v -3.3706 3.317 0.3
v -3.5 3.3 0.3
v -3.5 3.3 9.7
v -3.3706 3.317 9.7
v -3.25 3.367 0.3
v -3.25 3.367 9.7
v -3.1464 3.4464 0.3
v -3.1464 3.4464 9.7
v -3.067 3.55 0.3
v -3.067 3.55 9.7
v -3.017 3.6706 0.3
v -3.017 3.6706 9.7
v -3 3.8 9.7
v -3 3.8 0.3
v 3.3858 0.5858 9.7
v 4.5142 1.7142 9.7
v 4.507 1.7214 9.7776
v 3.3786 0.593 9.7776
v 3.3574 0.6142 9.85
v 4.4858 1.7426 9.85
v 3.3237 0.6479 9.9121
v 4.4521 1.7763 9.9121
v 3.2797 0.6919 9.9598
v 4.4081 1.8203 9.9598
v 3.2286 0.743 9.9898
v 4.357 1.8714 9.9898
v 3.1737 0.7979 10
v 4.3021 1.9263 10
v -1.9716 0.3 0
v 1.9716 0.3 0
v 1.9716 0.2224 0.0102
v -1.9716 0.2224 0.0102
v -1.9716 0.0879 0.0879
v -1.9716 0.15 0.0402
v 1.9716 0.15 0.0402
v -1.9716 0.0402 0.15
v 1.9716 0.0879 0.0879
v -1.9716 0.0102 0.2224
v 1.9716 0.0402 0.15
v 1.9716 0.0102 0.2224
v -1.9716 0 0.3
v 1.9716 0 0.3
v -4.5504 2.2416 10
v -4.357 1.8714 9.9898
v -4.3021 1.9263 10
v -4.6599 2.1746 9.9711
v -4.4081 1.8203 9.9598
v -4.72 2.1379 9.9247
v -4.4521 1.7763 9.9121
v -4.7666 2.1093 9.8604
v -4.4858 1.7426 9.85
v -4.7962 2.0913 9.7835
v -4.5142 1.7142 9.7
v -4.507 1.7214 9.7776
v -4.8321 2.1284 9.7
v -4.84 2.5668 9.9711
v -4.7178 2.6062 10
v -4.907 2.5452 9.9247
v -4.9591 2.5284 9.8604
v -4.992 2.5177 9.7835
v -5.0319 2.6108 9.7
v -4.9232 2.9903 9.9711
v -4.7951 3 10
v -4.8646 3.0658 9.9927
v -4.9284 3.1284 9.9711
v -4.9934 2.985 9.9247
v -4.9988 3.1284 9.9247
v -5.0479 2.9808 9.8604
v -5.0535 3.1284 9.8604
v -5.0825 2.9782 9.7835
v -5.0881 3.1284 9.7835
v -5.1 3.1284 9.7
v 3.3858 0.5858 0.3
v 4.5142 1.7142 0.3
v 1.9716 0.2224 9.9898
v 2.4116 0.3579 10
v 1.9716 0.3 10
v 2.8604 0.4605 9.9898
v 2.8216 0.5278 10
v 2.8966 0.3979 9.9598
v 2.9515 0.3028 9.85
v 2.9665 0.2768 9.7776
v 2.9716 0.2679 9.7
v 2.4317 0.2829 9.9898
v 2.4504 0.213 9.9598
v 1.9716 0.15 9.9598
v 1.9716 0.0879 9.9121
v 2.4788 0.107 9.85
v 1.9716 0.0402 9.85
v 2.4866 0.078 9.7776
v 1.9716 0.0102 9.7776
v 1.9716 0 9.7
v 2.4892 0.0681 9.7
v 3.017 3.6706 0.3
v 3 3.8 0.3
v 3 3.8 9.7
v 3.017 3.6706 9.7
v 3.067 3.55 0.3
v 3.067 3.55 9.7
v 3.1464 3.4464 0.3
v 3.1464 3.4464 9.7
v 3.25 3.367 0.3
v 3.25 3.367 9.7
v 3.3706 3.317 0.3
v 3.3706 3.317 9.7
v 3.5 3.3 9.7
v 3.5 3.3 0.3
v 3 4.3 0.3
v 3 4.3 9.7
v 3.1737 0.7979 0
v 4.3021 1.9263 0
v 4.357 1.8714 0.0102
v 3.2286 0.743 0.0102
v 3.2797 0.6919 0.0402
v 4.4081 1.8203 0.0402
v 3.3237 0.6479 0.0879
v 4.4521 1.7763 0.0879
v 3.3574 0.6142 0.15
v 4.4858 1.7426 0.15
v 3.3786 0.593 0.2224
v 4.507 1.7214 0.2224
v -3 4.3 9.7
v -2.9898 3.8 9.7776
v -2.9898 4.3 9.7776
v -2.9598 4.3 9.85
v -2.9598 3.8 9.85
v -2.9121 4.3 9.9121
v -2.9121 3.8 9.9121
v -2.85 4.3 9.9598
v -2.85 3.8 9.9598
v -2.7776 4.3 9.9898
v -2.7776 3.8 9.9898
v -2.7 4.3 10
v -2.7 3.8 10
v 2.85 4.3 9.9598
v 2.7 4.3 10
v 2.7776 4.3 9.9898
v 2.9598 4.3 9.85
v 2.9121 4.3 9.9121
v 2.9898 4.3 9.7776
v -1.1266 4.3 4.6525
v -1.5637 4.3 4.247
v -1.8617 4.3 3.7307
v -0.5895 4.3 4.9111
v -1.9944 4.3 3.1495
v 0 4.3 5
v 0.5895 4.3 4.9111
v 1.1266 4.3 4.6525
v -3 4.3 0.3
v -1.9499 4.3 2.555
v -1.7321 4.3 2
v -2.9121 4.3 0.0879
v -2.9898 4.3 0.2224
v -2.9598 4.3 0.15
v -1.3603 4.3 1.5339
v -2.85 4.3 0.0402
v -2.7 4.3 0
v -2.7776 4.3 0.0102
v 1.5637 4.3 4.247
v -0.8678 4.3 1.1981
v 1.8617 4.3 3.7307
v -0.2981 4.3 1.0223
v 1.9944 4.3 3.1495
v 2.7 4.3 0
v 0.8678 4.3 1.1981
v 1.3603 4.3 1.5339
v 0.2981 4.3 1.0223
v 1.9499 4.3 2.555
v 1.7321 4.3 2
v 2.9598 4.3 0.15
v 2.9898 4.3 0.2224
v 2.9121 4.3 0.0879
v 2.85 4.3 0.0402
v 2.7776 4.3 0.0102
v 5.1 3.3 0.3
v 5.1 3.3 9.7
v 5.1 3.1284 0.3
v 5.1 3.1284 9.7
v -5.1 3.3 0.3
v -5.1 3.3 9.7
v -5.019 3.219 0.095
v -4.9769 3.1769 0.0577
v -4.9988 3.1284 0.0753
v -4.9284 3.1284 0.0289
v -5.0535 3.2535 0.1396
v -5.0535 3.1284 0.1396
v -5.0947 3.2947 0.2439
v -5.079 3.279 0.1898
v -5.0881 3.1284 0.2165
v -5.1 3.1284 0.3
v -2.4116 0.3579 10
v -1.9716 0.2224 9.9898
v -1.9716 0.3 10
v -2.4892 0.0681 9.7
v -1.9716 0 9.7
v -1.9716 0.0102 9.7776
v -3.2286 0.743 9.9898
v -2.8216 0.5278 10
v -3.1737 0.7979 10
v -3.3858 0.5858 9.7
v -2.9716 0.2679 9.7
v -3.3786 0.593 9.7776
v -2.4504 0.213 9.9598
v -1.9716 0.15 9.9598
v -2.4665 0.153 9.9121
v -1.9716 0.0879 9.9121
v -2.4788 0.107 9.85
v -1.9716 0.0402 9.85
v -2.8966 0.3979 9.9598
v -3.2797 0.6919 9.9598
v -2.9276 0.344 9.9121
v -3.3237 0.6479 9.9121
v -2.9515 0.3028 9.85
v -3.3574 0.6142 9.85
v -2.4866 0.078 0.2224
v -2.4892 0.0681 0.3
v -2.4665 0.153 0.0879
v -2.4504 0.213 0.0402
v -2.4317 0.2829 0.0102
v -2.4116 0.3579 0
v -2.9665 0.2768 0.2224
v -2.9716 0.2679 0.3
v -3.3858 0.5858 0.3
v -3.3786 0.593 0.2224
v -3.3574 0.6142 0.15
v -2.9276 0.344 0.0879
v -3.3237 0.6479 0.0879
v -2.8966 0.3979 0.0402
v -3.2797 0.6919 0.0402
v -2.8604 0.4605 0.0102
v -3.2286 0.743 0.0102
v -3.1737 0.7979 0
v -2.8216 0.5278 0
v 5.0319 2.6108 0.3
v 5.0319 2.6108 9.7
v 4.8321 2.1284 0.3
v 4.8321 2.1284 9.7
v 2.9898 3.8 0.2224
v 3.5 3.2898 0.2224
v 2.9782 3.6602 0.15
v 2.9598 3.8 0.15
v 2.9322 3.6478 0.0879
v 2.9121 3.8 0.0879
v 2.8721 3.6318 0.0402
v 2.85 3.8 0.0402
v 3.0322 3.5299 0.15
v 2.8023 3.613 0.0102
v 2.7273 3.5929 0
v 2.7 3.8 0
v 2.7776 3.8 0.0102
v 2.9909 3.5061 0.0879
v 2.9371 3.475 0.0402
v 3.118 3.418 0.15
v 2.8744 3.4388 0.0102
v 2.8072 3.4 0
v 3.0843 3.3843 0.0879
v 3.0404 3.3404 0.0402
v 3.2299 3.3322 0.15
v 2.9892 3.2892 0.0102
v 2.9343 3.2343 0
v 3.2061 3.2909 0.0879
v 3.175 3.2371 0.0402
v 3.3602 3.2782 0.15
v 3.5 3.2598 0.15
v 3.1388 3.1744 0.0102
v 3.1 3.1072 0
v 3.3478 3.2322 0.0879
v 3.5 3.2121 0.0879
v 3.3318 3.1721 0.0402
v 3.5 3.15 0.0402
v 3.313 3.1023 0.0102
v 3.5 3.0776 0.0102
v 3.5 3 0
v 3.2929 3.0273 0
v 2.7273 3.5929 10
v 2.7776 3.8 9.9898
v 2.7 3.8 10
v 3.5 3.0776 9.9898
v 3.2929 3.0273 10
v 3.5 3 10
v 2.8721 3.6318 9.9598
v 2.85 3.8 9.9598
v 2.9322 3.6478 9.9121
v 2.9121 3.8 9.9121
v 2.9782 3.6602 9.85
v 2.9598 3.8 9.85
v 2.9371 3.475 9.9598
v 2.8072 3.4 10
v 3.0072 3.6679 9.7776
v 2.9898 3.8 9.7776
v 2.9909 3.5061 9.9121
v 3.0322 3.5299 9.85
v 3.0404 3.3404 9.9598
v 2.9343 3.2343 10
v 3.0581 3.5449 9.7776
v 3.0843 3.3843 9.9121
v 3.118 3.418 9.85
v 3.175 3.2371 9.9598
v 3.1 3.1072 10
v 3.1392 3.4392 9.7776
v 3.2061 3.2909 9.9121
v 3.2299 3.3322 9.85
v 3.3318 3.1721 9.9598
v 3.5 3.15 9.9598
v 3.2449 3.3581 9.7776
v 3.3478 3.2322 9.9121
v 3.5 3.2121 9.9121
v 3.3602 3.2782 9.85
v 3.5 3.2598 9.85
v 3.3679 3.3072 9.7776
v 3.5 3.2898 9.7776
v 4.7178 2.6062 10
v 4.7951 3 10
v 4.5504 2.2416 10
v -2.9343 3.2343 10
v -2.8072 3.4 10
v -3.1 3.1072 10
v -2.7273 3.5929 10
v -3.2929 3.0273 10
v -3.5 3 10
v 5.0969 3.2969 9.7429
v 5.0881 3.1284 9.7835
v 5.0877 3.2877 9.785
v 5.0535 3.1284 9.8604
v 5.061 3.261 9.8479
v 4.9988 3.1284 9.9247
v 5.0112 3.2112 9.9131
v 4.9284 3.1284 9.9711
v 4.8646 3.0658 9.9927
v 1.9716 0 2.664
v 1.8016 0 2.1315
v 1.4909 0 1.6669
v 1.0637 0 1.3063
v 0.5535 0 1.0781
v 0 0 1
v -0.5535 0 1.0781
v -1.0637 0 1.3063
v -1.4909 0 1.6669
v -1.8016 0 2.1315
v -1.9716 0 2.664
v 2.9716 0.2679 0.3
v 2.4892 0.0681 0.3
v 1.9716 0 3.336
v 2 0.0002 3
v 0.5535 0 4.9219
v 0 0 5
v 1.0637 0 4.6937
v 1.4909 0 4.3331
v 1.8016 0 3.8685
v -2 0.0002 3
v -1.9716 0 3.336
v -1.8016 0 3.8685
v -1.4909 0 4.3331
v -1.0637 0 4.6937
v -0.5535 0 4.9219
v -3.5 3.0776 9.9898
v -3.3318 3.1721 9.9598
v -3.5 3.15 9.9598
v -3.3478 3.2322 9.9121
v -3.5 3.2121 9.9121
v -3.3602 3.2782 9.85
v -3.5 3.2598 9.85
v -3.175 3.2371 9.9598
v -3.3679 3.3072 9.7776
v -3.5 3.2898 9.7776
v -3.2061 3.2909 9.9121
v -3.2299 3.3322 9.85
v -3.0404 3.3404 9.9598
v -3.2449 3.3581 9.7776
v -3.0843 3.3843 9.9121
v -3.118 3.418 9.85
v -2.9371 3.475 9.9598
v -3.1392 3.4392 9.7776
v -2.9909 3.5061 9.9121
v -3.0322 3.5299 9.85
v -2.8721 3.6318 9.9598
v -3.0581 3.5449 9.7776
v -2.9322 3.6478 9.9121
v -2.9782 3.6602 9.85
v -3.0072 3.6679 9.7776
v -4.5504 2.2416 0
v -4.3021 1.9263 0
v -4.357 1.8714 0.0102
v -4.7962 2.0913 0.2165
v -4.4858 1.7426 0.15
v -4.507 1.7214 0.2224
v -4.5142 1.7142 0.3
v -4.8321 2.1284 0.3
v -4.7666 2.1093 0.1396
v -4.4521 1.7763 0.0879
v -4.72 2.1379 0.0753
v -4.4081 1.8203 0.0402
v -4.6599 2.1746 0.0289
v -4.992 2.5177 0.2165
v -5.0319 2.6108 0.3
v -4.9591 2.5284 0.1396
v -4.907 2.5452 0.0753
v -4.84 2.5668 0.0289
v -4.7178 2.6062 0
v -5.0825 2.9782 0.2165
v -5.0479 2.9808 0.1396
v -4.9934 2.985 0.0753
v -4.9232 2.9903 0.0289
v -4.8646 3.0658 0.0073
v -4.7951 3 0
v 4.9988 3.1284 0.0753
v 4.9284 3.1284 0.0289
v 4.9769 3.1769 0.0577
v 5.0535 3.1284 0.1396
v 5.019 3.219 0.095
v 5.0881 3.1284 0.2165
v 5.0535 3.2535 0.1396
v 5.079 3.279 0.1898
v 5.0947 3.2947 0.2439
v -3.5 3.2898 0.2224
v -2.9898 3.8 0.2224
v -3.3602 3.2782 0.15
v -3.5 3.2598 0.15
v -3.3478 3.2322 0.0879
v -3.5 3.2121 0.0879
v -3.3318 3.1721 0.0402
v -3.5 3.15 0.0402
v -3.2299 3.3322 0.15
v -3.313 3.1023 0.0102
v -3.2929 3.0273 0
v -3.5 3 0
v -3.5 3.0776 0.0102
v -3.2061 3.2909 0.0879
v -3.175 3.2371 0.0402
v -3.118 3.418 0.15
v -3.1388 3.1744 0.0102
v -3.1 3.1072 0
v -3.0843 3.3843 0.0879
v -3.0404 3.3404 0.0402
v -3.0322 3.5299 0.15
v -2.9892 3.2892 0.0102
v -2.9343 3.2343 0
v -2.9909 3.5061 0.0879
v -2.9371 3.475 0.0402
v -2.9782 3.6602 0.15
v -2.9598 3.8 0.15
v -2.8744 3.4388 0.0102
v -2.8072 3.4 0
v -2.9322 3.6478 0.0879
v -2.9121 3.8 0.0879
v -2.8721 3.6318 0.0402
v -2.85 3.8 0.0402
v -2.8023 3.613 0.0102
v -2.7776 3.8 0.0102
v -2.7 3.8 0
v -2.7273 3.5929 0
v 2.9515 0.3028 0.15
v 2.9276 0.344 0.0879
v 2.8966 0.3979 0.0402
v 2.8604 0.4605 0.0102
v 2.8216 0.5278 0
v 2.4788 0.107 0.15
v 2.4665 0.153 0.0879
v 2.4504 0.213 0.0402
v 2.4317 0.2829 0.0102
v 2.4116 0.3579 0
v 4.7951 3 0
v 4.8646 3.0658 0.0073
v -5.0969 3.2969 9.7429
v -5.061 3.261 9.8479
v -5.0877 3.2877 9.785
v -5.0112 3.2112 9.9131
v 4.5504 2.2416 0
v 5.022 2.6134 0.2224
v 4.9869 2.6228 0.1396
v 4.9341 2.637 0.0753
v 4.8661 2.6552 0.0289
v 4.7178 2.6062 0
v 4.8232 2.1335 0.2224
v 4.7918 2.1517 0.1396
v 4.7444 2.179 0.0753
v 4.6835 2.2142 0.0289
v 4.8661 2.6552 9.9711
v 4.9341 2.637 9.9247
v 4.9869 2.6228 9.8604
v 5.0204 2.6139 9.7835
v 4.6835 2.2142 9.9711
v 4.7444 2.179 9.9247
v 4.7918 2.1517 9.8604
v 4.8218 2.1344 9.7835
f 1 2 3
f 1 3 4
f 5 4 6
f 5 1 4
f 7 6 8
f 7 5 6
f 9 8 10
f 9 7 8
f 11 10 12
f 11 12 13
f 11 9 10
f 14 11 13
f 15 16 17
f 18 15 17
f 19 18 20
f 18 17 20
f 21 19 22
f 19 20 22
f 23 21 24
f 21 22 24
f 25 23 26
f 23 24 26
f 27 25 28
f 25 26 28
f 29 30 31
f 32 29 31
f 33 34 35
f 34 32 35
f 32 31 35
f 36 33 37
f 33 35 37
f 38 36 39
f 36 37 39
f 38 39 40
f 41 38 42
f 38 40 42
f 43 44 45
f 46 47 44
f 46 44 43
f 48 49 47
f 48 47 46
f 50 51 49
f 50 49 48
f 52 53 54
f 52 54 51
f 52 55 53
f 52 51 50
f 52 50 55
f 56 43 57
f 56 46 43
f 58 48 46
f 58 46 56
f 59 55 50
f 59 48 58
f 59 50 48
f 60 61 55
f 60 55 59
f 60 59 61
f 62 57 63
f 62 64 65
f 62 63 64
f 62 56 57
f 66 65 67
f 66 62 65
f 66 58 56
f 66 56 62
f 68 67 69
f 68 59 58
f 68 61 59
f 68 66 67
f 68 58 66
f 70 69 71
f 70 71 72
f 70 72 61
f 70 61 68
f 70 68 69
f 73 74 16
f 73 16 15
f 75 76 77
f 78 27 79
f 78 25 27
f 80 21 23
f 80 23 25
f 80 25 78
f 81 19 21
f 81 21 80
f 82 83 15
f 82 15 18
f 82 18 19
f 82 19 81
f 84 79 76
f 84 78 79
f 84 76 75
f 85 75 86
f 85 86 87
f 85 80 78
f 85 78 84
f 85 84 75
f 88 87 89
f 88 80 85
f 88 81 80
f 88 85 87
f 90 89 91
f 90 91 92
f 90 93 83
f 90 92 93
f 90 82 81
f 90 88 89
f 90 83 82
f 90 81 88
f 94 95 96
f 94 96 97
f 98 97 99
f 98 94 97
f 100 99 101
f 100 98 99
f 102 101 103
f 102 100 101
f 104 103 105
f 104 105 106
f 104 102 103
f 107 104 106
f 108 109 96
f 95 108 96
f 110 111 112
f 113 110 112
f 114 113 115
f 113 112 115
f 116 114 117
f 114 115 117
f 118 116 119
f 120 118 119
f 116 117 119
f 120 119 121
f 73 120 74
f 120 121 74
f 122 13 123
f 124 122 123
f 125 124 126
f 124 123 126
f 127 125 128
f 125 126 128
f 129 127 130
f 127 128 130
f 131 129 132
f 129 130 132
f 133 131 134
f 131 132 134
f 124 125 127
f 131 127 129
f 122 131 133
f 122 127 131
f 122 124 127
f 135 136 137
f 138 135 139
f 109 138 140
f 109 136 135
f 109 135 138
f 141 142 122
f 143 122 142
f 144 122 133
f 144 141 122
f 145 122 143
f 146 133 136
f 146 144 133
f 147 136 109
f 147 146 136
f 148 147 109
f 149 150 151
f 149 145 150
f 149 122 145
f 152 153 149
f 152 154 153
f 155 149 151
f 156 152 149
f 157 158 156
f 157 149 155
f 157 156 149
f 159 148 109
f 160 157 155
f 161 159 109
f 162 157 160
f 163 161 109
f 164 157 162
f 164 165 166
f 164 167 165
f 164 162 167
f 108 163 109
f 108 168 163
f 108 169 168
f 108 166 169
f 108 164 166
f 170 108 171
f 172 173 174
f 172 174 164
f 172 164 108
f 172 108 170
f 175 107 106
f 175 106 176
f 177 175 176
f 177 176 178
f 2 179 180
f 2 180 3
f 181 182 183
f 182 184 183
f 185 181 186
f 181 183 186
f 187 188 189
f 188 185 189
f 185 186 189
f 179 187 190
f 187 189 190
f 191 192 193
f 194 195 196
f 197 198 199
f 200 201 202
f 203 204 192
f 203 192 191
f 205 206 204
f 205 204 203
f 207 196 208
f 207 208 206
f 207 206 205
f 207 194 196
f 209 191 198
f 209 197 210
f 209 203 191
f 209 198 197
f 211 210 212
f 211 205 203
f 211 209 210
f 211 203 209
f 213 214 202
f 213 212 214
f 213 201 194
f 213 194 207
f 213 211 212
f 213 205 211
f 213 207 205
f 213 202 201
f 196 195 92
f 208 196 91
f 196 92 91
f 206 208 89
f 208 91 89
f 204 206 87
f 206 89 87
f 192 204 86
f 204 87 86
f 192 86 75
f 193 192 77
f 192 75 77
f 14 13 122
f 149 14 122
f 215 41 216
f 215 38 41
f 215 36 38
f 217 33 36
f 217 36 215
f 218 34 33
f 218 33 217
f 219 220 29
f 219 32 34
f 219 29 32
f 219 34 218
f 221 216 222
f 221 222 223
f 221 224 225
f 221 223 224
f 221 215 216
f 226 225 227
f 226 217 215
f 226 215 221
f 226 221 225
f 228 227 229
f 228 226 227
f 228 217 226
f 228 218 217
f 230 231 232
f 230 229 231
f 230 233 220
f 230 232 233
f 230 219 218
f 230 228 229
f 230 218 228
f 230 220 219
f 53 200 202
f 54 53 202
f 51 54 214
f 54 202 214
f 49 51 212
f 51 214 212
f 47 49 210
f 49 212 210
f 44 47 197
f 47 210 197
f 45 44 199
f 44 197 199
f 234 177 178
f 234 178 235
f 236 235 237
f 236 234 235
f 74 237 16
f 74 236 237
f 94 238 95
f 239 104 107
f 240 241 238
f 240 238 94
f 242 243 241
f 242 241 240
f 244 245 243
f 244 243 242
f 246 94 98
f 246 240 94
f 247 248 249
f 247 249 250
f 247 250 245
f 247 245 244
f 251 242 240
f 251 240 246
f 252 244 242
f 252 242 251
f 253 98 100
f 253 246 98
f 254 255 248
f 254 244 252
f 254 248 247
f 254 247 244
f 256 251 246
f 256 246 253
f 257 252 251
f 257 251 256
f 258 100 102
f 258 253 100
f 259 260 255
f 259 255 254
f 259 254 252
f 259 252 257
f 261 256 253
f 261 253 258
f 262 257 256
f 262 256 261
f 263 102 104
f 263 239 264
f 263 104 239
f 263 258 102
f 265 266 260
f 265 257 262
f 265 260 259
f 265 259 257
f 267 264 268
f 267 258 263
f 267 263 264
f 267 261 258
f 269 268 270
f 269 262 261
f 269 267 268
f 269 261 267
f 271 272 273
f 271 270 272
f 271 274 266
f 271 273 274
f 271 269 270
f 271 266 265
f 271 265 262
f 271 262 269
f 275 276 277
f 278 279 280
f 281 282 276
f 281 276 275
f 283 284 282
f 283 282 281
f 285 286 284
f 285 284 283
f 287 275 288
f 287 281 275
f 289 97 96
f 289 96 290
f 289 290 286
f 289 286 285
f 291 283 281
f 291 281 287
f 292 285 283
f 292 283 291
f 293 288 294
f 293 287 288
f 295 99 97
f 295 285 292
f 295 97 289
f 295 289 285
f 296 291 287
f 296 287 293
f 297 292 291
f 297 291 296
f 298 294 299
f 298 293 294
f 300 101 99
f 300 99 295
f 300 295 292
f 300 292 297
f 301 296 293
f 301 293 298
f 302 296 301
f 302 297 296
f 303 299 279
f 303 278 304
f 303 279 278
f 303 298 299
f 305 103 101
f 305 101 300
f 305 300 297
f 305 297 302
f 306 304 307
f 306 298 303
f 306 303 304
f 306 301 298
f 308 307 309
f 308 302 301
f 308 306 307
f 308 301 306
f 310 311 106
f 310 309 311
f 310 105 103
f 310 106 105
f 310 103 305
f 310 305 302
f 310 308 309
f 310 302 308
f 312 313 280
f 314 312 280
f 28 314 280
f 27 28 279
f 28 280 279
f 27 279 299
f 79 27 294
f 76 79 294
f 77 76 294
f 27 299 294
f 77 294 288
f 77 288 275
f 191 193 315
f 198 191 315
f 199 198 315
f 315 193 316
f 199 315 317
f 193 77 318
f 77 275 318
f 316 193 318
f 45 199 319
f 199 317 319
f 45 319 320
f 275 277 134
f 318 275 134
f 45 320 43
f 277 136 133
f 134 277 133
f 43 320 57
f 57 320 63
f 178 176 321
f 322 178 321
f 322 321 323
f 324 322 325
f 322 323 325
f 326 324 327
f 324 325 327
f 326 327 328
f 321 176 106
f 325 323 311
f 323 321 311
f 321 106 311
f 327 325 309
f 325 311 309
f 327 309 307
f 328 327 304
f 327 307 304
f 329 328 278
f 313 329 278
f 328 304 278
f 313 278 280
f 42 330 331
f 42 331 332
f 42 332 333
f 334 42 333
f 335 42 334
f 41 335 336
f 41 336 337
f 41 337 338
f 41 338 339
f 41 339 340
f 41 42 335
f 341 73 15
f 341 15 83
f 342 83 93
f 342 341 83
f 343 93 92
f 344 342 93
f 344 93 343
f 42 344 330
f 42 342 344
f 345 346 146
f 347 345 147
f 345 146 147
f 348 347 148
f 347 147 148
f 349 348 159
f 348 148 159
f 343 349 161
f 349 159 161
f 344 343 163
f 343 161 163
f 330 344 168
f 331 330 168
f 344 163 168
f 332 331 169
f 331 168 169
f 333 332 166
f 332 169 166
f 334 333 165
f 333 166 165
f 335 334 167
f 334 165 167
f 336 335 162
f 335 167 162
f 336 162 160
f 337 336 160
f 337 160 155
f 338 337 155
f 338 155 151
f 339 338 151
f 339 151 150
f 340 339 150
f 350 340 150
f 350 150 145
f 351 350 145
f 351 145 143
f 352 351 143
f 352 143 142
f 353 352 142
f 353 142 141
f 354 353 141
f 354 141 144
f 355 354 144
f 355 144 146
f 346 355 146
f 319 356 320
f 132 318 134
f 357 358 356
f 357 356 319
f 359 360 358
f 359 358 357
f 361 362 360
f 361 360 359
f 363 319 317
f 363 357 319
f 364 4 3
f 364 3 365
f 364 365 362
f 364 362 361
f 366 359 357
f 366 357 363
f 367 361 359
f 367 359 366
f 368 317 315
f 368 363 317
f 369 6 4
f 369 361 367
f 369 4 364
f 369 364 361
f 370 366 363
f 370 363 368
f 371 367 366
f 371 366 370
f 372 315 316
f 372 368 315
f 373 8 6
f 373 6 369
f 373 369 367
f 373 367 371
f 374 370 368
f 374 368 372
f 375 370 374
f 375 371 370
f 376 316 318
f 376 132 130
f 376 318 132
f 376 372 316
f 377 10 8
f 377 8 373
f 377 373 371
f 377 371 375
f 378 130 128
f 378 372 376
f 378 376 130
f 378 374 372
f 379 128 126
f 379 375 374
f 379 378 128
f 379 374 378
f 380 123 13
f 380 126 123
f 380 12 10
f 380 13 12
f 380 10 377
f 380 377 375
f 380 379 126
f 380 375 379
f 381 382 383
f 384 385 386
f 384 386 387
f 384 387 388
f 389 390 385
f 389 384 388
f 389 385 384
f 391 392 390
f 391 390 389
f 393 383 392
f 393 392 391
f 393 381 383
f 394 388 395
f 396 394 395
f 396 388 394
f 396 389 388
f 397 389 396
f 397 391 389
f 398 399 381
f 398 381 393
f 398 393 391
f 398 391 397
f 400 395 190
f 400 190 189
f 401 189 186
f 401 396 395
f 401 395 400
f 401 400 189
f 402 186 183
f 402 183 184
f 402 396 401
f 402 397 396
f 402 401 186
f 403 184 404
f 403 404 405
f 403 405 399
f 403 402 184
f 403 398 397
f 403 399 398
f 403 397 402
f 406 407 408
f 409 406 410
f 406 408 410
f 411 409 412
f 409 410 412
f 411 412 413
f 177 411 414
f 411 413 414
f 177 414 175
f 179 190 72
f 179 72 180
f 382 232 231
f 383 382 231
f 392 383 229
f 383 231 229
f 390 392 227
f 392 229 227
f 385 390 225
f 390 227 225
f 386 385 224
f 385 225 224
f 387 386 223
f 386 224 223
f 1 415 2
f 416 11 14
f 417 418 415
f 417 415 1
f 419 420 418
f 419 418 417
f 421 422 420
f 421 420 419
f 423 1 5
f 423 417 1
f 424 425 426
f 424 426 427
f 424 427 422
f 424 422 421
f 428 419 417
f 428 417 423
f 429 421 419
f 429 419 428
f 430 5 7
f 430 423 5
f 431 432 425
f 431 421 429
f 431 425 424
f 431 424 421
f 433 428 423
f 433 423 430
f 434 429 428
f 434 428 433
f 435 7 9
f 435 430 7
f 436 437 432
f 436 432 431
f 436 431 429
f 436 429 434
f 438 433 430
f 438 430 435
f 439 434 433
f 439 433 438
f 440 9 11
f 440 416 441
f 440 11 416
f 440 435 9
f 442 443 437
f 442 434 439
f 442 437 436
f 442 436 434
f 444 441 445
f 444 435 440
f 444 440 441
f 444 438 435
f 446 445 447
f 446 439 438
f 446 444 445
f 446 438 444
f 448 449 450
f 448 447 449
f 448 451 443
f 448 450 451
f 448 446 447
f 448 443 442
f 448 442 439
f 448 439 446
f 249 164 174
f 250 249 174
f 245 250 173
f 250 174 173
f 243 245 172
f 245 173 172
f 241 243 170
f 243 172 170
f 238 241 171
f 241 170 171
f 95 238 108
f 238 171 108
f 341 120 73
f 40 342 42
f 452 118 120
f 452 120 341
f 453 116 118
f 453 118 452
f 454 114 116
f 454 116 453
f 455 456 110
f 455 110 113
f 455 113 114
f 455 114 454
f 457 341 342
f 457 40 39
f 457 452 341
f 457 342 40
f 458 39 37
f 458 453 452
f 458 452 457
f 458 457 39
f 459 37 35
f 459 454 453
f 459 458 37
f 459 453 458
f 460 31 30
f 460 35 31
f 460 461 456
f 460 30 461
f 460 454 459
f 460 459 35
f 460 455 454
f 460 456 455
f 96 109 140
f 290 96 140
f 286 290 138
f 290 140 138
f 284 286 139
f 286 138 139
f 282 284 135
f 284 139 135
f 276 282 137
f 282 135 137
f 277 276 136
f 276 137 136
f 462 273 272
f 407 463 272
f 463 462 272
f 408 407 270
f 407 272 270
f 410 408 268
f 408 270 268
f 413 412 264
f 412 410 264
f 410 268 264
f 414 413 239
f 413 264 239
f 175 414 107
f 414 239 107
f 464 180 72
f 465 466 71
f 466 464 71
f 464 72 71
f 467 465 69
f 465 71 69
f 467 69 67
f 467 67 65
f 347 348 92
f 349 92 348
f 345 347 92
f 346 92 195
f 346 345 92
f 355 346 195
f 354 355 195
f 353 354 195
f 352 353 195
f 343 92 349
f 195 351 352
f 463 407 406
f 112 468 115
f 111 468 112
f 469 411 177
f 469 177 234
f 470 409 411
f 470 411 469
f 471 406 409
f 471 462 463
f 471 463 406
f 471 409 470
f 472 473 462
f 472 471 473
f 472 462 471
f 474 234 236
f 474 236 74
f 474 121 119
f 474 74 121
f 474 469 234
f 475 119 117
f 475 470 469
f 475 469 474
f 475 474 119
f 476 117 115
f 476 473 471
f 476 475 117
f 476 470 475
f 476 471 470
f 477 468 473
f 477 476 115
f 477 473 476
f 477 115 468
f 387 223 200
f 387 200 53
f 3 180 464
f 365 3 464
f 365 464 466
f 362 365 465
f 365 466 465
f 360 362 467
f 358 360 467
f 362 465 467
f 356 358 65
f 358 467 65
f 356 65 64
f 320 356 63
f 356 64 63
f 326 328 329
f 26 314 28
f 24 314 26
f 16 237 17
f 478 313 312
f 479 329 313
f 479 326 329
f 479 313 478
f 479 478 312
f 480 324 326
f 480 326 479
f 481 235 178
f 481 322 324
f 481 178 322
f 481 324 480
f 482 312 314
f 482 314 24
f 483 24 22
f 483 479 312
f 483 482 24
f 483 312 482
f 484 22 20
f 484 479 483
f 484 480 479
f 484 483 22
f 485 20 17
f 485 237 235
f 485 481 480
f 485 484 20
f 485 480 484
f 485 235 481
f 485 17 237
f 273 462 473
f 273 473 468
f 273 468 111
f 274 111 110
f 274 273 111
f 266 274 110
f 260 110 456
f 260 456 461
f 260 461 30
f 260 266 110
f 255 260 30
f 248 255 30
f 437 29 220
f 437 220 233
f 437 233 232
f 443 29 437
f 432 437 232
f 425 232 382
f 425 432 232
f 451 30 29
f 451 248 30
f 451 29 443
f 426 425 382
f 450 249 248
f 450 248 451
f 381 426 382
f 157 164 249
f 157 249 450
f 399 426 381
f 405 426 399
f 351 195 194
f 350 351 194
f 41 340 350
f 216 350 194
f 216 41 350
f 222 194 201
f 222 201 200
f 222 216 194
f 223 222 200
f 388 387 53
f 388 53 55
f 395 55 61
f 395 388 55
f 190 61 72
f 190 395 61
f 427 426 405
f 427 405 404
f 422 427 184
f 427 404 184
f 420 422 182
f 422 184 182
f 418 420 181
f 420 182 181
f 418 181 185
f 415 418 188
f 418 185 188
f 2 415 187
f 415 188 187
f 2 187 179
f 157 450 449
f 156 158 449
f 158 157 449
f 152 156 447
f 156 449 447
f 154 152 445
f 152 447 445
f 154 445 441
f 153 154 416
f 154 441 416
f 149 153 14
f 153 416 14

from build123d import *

# Parameters (mm, degrees)
EXTRUDE_1_DEPTH     = 10
FILLET_3_R          = 0.3
SKETCH_2_R          = 2
CUT_EXTRUDE_1_DEPTH = 6


with BuildPart() as part:
    # 草图1 → 凸台-拉伸1 (new body)
    with BuildSketch(Plane.XY):
        with BuildLine():
            Line((-3, 4.3), (3, 4.3))
            Line((3, 4.3), (3, 3.8))
            ThreePointArc((3, 3.8), (3.146446609, 3.446446609), (3.5, 3.3))
            Line((3.5, 3.3), (5.1, 3.3))
            Line((5.1, 3.3), (5.1, 3.128427125))
            ThreePointArc((5.1, 3.128427125), (4.947759065, 2.36306026), (4.514213562, 1.714213562))
            Line((4.514213562, 1.714213562), (3.385786438, 0.585786438))
            ThreePointArc((3.385786438, 0.585786438), (2.73693974, 0.152240935), (1.971572875, 0))
            Line((1.971572875, 0), (-1.971572875, 0))
            ThreePointArc((-1.971572875, 0), (-2.73693974, 0.152240935), (-3.385786438, 0.585786438))
            Line((-3.385786438, 0.585786438), (-4.514213562, 1.714213562))
            ThreePointArc((-4.514213562, 1.714213562), (-4.947759065, 2.36306026), (-5.1, 3.128427125))
            Line((-5.1, 3.128427125), (-5.1, 3.3))
            Line((-5.1, 3.3), (-3.5, 3.3))
            ThreePointArc((-3.5, 3.3), (-3.146446609, 3.446446609), (-3, 3.8))
            Line((-3, 3.8), (-3, 4.3))
        make_face()
    extrude(amount=EXTRUDE_1_DEPTH)

    # 圆角3
    # the kernel refuses this fillet: 0.3 mm, written as the material it takes off along each edge
    with BuildSketch(Plane(origin=(-3, 3.8, 10), x_dir=(0, 0, -1), z_dir=(0, 1, 0)), Plane(origin=(3, 5.05, 10), x_dir=(0, 0, -1), z_dir=(0, -1, 0))) as fillet_3_piece_1:
        with BuildLine():
            CenterArc((FILLET_3_R, -FILLET_3_R), FILLET_3_R, 90, 90)
            Line((0, -FILLET_3_R), (0, 0))
            Line((0, 0), (FILLET_3_R, 0))
        make_face()
    extrude(amount=1.25, mode=Mode.SUBTRACT)
    with BuildSketch(Plane(origin=(3, 5.05, 0), x_dir=(0, 0, 1), z_dir=(0, -1, 0)), Plane(origin=(-3, 3.8, 0), x_dir=(0, 0, 1), z_dir=(0, 1, 0))) as fillet_3_piece_2:
        with BuildLine():
            CenterArc((FILLET_3_R, FILLET_3_R), FILLET_3_R, 180, 90)
            Line((0, FILLET_3_R), (0, 0))
            Line((0, 0), (FILLET_3_R, 0))
        make_face()
    extrude(amount=1.25, mode=Mode.SUBTRACT)
    with BuildSketch(Plane(origin=(4.514213562, 1.714213562, 10), x_dir=(0, 0, -1), z_dir=(-0.7071067811865436, -0.7071067811865515, 0)), Plane(origin=(-3.385786438, 0.585786438, 10), x_dir=(0, 0, -1), z_dir=(-0.7071067811865436, 0.7071067811865515, 0))) as fillet_3_piece_3:
        with BuildLine():
            CenterArc((FILLET_3_R, -FILLET_3_R), FILLET_3_R, 90, 90)
            Line((0, -FILLET_3_R), (0, 0))
            Line((0, 0), (FILLET_3_R, 0))
        make_face()
    extrude(amount=1.595836944, mode=Mode.SUBTRACT)
    with BuildSketch(Plane(origin=(1.971572875, 2, 10), x_dir=(0.7071067811865542, -0.7071067811865409, 0), z_dir=(0.7071067811865409, 0.7071067811865542, 0))) as fillet_3_piece_4:
        with BuildLine():
            CenterArc((2 - FILLET_3_R, FILLET_3_R), FILLET_3_R, 270, 90)
            Line((2 - FILLET_3_R, 0), (2, 0))
            Line((2, 0), (2, FILLET_3_R))
        make_face()
    revolve(axis=Axis((1.971572875, 2, 10), (0, 0, -1)), revolution_arc=45, mode=Mode.SUBTRACT)
    with BuildSketch(Plane(origin=(1.971572875, 0, 10), x_dir=(0, 0, -1), z_dir=(-1, 0, 0))) as fillet_3_piece_5:
        with BuildLine():
            CenterArc((FILLET_3_R, -FILLET_3_R), FILLET_3_R, 90, 90)
            Line((0, -FILLET_3_R), (0, 0))
            Line((0, 0), (FILLET_3_R, 0))
        make_face()
    extrude(amount=3.943145751, mode=Mode.SUBTRACT)
    with BuildSketch(Plane(origin=(-1.971572875, 2, 10), x_dir=(0, -1, 0), z_dir=(1, 0, 0))) as fillet_3_piece_6:
        with BuildLine():
            CenterArc((2 - FILLET_3_R, FILLET_3_R), FILLET_3_R, 270, 90)
            Line((2 - FILLET_3_R, 0), (2, 0))
            Line((2, 0), (2, FILLET_3_R))
        make_face()
    revolve(axis=Axis((-1.971572875, 2, 10), (0, 0, -1)), revolution_arc=45, mode=Mode.SUBTRACT)
    with BuildSketch(Plane(origin=(-3.1, 3.128427125, 10), x_dir=(-0.7071067811865485, -0.7071067811865466, 0), z_dir=(0.7071067811865466, -0.7071067811865485, 0))) as fillet_3_piece_7:
        with BuildLine():
            CenterArc((2 - FILLET_3_R, FILLET_3_R), FILLET_3_R, 270, 90)
            Line((2 - FILLET_3_R, 0), (2, 0))
            Line((2, 0), (2, FILLET_3_R))
        make_face()
    revolve(axis=Axis((-3.1, 3.128427125, 10), (0, 0, -1)), revolution_arc=45, mode=Mode.SUBTRACT)
    with BuildSketch(Plane(origin=(-5.85, 3.3, 10), x_dir=(0, 0, -1), z_dir=(1, 0, 0)), Plane(origin=(3.5, 3.3, 10), x_dir=(0, 0, -1), z_dir=(1, 0, 0))) as fillet_3_piece_8:
        with BuildLine():
            CenterArc((FILLET_3_R, -FILLET_3_R), FILLET_3_R, 90, 90)
            Line((0, -FILLET_3_R), (0, 0))
            Line((0, 0), (FILLET_3_R, 0))
        make_face()
    extrude(amount=2.35, mode=Mode.SUBTRACT)
    with BuildSketch(Plane(origin=(-3.5, 3.8, 10), x_dir=(0, -1, 0), z_dir=(-1, 0, 0))) as fillet_3_piece_9:
        with BuildLine():
            CenterArc((0.5 + FILLET_3_R, -FILLET_3_R), FILLET_3_R, 90, 90)
            Line((0.5 + FILLET_3_R, 0), (0.5, 0))
            Line((0.5, 0), (0.5, -FILLET_3_R))
        make_face()
    revolve(axis=Axis((-3.5, 3.8, 10), (0, 0, 1)), revolution_arc=90, mode=Mode.SUBTRACT)
    with BuildSketch(Plane(origin=(3.5, 3.3, 0), x_dir=(0, 0, 1), z_dir=(1, 0, 0)), Plane(origin=(-5.85, 3.3, 0), x_dir=(0, 0, 1), z_dir=(1, 0, 0))) as fillet_3_piece_10:
        with BuildLine():
            CenterArc((FILLET_3_R, FILLET_3_R), FILLET_3_R, 180, 90)
            Line((0, FILLET_3_R), (0, 0))
            Line((0, 0), (FILLET_3_R, 0))
        make_face()
    extrude(amount=2.35, mode=Mode.SUBTRACT)
    with BuildSketch(Plane(origin=(3.5, 3.8, 0), x_dir=(-1, 0, 0), z_dir=(0, 1, 0))) as fillet_3_piece_11:
        with BuildLine():
            CenterArc((0.5 + FILLET_3_R, FILLET_3_R), FILLET_3_R, 180, 90)
            Line((0.5 + FILLET_3_R, 0), (0.5, 0))
            Line((0.5, 0), (0.5, FILLET_3_R))
        make_face()
    revolve(axis=Axis((3.5, 3.8, 0), (0, 0, 1)), revolution_arc=90, mode=Mode.SUBTRACT)
    with BuildSketch(Plane(origin=(-3.385786438, 0.585786438, 0), x_dir=(0, 0, 1), z_dir=(-0.7071067811865436, 0.7071067811865515, 0)), Plane(origin=(4.514213562, 1.714213562, 0), x_dir=(0, 0, 1), z_dir=(-0.7071067811865436, -0.7071067811865515, 0))) as fillet_3_piece_12:
        with BuildLine():
            CenterArc((FILLET_3_R, FILLET_3_R), FILLET_3_R, 180, 90)
            Line((0, FILLET_3_R), (0, 0))
            Line((0, 0), (FILLET_3_R, 0))
        make_face()
    extrude(amount=1.595836944, mode=Mode.SUBTRACT)
    with BuildSketch(Plane(origin=(-1.971572875, 2, 0), x_dir=(0, -1, 0), z_dir=(1, 0, 0))) as fillet_3_piece_13:
        with BuildLine():
            CenterArc((2 - FILLET_3_R, -FILLET_3_R), FILLET_3_R, 0, 90)
            Line((2 - FILLET_3_R, 0), (2, 0))
            Line((2, 0), (2, -FILLET_3_R))
        make_face()
    revolve(axis=Axis((-1.971572875, 2, 0), (0, 0, -1)), revolution_arc=45, mode=Mode.SUBTRACT)
    with BuildSketch(Plane(origin=(1.971572875, 0, 0), x_dir=(0, 0, 1), z_dir=(-1, 0, 0))) as fillet_3_piece_14:
        with BuildLine():
            CenterArc((FILLET_3_R, FILLET_3_R), FILLET_3_R, 180, 90)
            Line((0, FILLET_3_R), (0, 0))
            Line((0, 0), (FILLET_3_R, 0))
        make_face()
    extrude(amount=3.943145751, mode=Mode.SUBTRACT)
    with BuildSketch(Plane(origin=(1.971572875, 2, 0), x_dir=(0.7071067811865542, -0.7071067811865409, 0), z_dir=(0.7071067811865409, 0.7071067811865542, 0))) as fillet_3_piece_15:
        with BuildLine():
            CenterArc((2 - FILLET_3_R, -FILLET_3_R), FILLET_3_R, 0, 90)
            Line((2 - FILLET_3_R, 0), (2, 0))
            Line((2, 0), (2, -FILLET_3_R))
        make_face()
    revolve(axis=Axis((1.971572875, 2, 0), (0, 0, -1)), revolution_arc=45, mode=Mode.SUBTRACT)
    with BuildSketch(Plane(origin=(3.1, 3.128427125, 0), x_dir=(1, 0, 0), z_dir=(0, 1, 0))) as fillet_3_piece_16:
        with BuildLine():
            CenterArc((2 - FILLET_3_R, -FILLET_3_R), FILLET_3_R, 0, 90)
            Line((2 - FILLET_3_R, 0), (2, 0))
            Line((2, 0), (2, -FILLET_3_R))
        make_face()
    revolve(axis=Axis((3.1, 3.128427125, 0), (0, 0, -1)), revolution_arc=45, mode=Mode.SUBTRACT)
    with BuildSketch(Plane(origin=(3.1, 3.128427125, 10), x_dir=(1, 0, 0), z_dir=(0, 1, 0))) as fillet_3_piece_17:
        with BuildLine():
            CenterArc((2 - FILLET_3_R, FILLET_3_R), FILLET_3_R, 270, 90)
            Line((2 - FILLET_3_R, 0), (2, 0))
            Line((2, 0), (2, FILLET_3_R))
        make_face()
    revolve(axis=Axis((3.1, 3.128427125, 10), (0, 0, -1)), revolution_arc=45, mode=Mode.SUBTRACT)
    with BuildSketch(Plane(origin=(-3.1, 3.128427125, 0), x_dir=(-0.7071067811865485, -0.7071067811865466, 0), z_dir=(0.7071067811865466, -0.7071067811865485, 0))) as fillet_3_piece_18:
        with BuildLine():
            CenterArc((2 - FILLET_3_R, -FILLET_3_R), FILLET_3_R, 0, 90)
            Line((2 - FILLET_3_R, 0), (2, 0))
            Line((2, 0), (2, -FILLET_3_R))
        make_face()
    revolve(axis=Axis((-3.1, 3.128427125, 0), (0, 0, -1)), revolution_arc=45, mode=Mode.SUBTRACT)
    with BuildSketch(Plane(origin=(3.5, 3.8, 10), x_dir=(-1, 0, 0), z_dir=(0, 1, 0))) as fillet_3_piece_19:
        with BuildLine():
            CenterArc((0.5 + FILLET_3_R, -FILLET_3_R), FILLET_3_R, 90, 90)
            Line((0.5 + FILLET_3_R, 0), (0.5, 0))
            Line((0.5, 0), (0.5, -FILLET_3_R))
        make_face()
    revolve(axis=Axis((3.5, 3.8, 10), (0, 0, 1)), revolution_arc=90, mode=Mode.SUBTRACT)
    with BuildSketch(Plane(origin=(-3.5, 3.8, 0), x_dir=(0, -1, 0), z_dir=(-1, 0, 0))) as fillet_3_piece_20:
        with BuildLine():
            CenterArc((0.5 + FILLET_3_R, FILLET_3_R), FILLET_3_R, 180, 90)
            Line((0.5 + FILLET_3_R, 0), (0.5, 0))
            Line((0.5, 0), (0.5, FILLET_3_R))
        make_face()
    revolve(axis=Axis((-3.5, 3.8, 0), (0, 0, 1)), revolution_arc=90, mode=Mode.SUBTRACT)
    with BuildSketch(Plane(origin=(-5.1, 3.128427125, 0), x_dir=(0, 0, 1), z_dir=(0, 1, 0)), Plane(origin=(5.1, 4.05, 0), x_dir=(0, 0, 1), z_dir=(0, -1, 0))) as fillet_3_piece_21:
        with BuildLine():
            CenterArc((FILLET_3_R, FILLET_3_R), FILLET_3_R, 180, 90)
            Line((0, FILLET_3_R), (0, 0))
            Line((0, 0), (FILLET_3_R, 0))
        make_face()
    extrude(amount=0.921572875, mode=Mode.SUBTRACT)
    with BuildSketch(Plane(origin=(5.1, 4.05, 10), x_dir=(0, 0, -1), z_dir=(0, -1, 0)), Plane(origin=(-5.1, 3.128427125, 10), x_dir=(0, 0, -1), z_dir=(0, 1, 0))) as fillet_3_piece_22:
        with BuildLine():
            CenterArc((FILLET_3_R, -FILLET_3_R), FILLET_3_R, 90, 90)
            Line((0, -FILLET_3_R), (0, 0))
            Line((0, 0), (FILLET_3_R, 0))
        make_face()
    extrude(amount=0.921572875, mode=Mode.SUBTRACT)

    # 草图2 → 切除-拉伸1 (cut)
    with BuildSketch(Plane(origin=(0, 4.3, 0), x_dir=(1, 0, 0), z_dir=(0, 1, 0))):
        with Locations(Location((0, -3, 0), (0, 0, 270))):
            Circle(SKETCH_2_R)
    extrude(amount=-CUT_EXTRUDE_1_DEPTH, mode=Mode.SUBTRACT)


solid = part.part
